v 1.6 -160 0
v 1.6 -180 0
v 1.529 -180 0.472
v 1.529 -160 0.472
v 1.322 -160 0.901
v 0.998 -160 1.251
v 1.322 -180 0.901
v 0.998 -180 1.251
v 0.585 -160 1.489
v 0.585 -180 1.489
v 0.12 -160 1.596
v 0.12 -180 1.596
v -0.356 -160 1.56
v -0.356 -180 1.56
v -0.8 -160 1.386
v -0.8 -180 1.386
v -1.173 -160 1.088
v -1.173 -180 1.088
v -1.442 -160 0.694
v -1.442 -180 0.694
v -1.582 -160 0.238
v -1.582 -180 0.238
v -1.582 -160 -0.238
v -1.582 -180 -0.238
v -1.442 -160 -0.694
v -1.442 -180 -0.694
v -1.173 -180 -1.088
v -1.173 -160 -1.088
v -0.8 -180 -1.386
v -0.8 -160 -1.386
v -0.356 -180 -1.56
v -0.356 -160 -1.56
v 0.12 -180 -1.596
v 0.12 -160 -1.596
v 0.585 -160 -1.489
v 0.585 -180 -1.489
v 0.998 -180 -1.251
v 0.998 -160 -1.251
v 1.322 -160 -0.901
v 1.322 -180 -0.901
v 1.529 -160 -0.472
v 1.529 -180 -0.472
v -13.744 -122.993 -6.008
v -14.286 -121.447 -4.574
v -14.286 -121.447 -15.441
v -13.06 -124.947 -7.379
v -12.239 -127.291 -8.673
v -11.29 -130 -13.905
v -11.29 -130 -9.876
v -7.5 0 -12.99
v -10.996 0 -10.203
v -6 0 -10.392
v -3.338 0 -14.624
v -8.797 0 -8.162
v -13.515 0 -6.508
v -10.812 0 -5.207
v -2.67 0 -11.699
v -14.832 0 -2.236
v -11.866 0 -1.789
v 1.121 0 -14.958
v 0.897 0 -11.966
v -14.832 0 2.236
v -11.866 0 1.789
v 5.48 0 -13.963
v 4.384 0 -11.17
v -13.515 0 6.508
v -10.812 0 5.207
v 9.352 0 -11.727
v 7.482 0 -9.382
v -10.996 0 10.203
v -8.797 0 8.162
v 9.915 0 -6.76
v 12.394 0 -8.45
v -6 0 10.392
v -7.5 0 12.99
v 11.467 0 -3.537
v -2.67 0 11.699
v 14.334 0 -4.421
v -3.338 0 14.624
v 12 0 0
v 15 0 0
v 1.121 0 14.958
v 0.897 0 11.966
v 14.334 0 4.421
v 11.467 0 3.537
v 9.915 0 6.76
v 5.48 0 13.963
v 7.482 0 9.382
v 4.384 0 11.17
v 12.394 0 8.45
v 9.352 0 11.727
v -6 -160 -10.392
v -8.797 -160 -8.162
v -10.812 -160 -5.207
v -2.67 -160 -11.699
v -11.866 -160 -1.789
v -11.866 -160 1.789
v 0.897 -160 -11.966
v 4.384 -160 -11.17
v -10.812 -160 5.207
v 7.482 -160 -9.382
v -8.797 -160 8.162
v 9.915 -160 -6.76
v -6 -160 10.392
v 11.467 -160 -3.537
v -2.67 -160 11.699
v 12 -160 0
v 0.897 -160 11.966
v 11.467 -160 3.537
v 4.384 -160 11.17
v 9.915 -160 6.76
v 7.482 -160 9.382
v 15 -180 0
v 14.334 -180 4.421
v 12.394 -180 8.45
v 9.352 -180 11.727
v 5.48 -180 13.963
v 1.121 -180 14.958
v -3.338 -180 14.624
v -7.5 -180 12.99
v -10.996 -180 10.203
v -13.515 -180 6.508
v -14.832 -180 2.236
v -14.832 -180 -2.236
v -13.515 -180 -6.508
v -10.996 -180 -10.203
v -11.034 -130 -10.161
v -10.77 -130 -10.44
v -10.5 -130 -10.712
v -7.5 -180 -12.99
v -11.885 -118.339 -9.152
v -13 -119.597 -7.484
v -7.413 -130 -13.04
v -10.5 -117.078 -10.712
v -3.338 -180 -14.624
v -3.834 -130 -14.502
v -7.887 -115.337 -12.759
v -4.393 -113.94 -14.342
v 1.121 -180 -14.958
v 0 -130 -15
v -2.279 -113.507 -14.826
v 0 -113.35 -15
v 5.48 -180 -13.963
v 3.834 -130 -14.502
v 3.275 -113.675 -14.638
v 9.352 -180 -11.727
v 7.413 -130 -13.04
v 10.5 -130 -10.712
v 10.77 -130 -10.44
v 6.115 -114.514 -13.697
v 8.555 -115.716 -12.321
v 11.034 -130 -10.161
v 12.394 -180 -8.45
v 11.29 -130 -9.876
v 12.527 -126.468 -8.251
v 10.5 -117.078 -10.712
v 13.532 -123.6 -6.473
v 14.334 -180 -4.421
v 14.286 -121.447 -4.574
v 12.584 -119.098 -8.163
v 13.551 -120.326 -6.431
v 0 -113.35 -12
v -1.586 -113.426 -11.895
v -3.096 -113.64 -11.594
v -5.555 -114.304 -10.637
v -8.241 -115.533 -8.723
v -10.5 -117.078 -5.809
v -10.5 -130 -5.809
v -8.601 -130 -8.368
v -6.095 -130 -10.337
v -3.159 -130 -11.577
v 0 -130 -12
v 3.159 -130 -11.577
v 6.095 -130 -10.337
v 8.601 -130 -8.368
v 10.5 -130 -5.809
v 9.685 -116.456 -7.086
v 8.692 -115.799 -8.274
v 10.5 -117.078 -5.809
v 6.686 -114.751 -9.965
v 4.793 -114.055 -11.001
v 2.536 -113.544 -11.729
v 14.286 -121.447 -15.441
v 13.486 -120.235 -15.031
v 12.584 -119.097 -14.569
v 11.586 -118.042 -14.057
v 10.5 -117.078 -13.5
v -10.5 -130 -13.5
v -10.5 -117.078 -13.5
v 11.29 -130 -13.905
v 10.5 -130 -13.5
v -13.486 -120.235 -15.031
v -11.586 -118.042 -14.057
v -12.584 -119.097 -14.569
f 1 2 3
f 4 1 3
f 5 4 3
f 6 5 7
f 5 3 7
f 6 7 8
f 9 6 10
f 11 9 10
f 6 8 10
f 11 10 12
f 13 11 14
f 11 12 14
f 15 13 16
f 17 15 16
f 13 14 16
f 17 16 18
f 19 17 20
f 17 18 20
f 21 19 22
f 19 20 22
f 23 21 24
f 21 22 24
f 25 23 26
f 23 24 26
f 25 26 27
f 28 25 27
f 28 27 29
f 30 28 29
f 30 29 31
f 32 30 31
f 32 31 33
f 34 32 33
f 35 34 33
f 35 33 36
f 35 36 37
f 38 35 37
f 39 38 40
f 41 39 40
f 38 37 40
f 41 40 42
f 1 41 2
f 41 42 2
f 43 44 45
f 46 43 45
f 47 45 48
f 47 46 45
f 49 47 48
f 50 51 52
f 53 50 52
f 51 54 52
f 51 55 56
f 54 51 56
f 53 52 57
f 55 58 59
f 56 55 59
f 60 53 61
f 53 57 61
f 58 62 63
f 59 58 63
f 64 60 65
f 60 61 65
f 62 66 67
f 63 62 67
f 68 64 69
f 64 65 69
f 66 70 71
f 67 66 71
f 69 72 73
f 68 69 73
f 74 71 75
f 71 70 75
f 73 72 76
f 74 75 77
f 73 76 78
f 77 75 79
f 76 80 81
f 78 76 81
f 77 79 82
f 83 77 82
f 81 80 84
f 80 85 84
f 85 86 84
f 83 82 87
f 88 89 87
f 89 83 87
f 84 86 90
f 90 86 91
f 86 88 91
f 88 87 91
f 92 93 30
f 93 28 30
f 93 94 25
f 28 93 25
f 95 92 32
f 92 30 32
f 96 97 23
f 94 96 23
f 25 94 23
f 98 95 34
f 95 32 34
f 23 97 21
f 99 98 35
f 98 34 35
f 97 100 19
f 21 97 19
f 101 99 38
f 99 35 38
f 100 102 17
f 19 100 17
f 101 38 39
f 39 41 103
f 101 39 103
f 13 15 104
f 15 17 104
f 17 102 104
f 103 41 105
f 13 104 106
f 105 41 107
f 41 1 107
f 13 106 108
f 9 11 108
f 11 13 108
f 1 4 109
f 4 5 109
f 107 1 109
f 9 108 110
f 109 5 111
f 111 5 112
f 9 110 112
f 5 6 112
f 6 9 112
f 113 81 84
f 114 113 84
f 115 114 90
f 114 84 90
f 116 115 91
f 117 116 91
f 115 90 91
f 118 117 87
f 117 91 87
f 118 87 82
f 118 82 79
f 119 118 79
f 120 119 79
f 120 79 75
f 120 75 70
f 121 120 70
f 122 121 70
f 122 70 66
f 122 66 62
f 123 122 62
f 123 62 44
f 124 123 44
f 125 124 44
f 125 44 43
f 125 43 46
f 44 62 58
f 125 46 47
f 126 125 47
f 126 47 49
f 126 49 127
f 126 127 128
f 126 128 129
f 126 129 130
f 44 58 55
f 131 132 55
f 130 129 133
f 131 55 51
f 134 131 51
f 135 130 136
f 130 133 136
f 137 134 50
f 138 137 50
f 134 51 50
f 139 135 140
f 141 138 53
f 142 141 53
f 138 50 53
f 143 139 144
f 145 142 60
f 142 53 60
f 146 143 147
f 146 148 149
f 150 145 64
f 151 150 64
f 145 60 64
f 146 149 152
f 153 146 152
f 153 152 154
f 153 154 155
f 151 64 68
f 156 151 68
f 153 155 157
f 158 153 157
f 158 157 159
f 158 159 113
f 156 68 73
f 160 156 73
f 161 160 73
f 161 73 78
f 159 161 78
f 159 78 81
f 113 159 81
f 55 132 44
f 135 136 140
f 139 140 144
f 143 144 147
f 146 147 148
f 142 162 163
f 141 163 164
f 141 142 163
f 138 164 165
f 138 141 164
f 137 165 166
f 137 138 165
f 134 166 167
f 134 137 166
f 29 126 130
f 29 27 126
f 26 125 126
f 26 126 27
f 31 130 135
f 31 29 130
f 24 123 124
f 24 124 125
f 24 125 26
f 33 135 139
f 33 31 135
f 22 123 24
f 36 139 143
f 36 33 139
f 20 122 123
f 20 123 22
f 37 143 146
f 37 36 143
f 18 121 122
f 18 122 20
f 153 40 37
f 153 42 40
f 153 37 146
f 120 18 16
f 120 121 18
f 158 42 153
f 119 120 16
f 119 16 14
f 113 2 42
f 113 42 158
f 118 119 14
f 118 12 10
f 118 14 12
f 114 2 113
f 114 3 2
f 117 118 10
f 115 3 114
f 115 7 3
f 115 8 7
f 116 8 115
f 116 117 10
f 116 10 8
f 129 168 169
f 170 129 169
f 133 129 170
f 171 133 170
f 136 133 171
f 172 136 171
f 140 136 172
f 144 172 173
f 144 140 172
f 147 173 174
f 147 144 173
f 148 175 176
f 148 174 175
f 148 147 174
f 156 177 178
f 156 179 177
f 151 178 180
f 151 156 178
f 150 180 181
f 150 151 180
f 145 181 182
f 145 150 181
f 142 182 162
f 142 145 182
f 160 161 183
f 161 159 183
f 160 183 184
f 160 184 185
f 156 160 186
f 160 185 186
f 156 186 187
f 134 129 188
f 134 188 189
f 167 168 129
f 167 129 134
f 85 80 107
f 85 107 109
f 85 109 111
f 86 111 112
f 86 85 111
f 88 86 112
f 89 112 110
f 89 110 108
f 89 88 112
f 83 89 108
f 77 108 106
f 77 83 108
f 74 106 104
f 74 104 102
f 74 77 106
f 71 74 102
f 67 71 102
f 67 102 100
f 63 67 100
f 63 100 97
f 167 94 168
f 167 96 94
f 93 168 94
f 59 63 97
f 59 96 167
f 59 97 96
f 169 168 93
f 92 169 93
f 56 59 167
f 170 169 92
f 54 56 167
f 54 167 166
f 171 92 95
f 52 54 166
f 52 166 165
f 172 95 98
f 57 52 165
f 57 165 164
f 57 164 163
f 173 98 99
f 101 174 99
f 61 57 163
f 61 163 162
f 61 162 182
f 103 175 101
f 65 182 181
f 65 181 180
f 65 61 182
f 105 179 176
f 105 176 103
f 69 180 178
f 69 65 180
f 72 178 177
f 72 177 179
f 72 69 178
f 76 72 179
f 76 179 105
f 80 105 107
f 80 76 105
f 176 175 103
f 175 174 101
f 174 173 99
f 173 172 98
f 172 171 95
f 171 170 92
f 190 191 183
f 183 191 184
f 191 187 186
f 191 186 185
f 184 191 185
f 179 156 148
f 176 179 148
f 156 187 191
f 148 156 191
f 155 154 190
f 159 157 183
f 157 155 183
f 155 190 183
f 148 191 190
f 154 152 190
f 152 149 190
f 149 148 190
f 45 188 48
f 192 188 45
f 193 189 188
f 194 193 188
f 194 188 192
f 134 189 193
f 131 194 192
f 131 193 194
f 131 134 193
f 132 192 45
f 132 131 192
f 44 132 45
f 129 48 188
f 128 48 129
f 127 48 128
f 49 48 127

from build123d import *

# Parameters (mm, degrees)
F0_R         = 15
F0_R_2       = 12
F1_DEPTH     = 180
F2_DEPTH     = 160
F5_DEPTH     = 20
F6_DEPTH     = 18
F7_DEPTH     = 0.5
F8_DEPTH     = 160
F9_T1_DEPTH  = 33.1189779758
F10_T1_DEPTH = 33.1189779758
F11_R        = 1.6
F12_DEPTH    = 20


# Not quite as in the source:
# - a fillet or chamfer that OpenCascade refuses, or shapes differently, is made with other operations: its cross-section is extruded or revolved along the edge and cut away or added


with BuildPart() as f1:
    # F0 (on Front) → F1 (new body)
    with BuildSketch(Plane.XZ):
        Circle(F0_R)
        Circle(F0_R_2, mode=Mode.SUBTRACT)
        Circle(F0_R_2)
    extrude(amount=F1_DEPTH)

    # F0 (on Front) → F2 (cut)
    with BuildSketch(Plane.XZ):
        Circle(F0_R_2)
    extrude(amount=F2_DEPTH, mode=Mode.SUBTRACT)

    # F4 (on offset) → F5 (cut)
    with BuildSketch(Plane.XY.offset(-15)):
        with BuildLine():
            ThreePointArc((10.5, -117.0782160674), (5.5711218584, -114.3097131563), (0, -113.35))
            Line((0, -113.35), (0, -130))
            Line((0, -130), (7, -130))
            Line((7, -130), (10.5, -130))
            Line((10.5, -130), (10.5, -117.0782160674))
        make_face()
        with BuildLine():
            Line((0, -130), (0, -113.35))
            ThreePointArc((0, -113.35), (-5.5711218584, -114.3097131563), (-10.5, -117.0782160674))
            Line((-10.5, -117.0782160674), (-10.5, -130))
            Line((-10.5, -130), (-7, -130))
            Line((-7, -130), (0, -130))
        make_face()
    extrude(amount=F5_DEPTH, mode=Mode.SUBTRACT)

    # F4 (on offset) → F6 (join)
    with BuildSketch(Plane.XY.offset(-15)):
        with BuildLine():
            ThreePointArc((14.2855073516, -121.4474109355), (12.5838312774, -119.0972622529), (10.5, -117.0782160674))
            Line((10.5, -117.0782160674), (10.5, -130))
            Line((10.5, -130), (11.29, -130))
            Line((11.29, -130), (14.2855073516, -121.4474109355))
        make_face()
        with BuildLine():
            Line((-10.5, -130), (-10.5, -117.0782160674))
            ThreePointArc((-10.5, -117.0782160674), (-12.5838312774, -119.0972622529), (-14.2855073516, -121.4474109355))
            Line((-14.2855073516, -121.4474109355), (-11.29, -130))
            Line((-11.29, -130), (-10.5, -130))
        make_face()
    extrude(amount=F6_DEPTH)

    # F4 (on offset) → F7 (join)
    with BuildSketch(Plane.XY.offset(-15)):
        with BuildLine():
            Line((-10.5, -130), (-10.5, -117.0782160674))
            ThreePointArc((-10.5, -117.0782160674), (-12.5838312774, -119.0972622529), (-14.2855073516, -121.4474109355))
            Line((-14.2855073516, -121.4474109355), (-11.29, -130))
            Line((-11.29, -130), (-10.5, -130))
        make_face()
        with BuildLine():
            ThreePointArc((14.2855073516, -121.4474109355), (12.5838312774, -119.0972622529), (10.5, -117.0782160674))
            Line((10.5, -117.0782160674), (10.5, -130))
            Line((10.5, -130), (11.29, -130))
            Line((11.29, -130), (14.2855073516, -121.4474109355))
        make_face()
    extrude(amount=-F7_DEPTH)

    # F0 (on Front) → F8 (cut)
    with BuildSketch(Plane.XZ):
        Circle(F0_R_2)
    extrude(amount=F8_DEPTH, mode=Mode.SUBTRACT)

    # F9: chamfer of 3.9 x 2 on 1 edges, made by hand

    # F9_s2 → F9_t1 (cut)
    with BuildSketch(Plane.XZ.offset(106.9796190458)):
        Polygon((10.5, -13.5), (14.4, -15.5), (10.5, -15.5), align=None)
    extrude(amount=F9_T1_DEPTH, mode=Mode.SUBTRACT)

    # F10: chamfer of 2 x 3.9 on 1 edges, made by hand

    # F10_s2 → F10_t1 (cut)
    with BuildSketch(Plane.XZ.offset(106.9796190458)):
        Polygon((-10.5, -13.5), (-14.4, -15.5), (-10.5, -15.5), align=None)
    extrude(amount=F10_T1_DEPTH, mode=Mode.SUBTRACT)

    # F11 (on face) → F12 (cut)
    with BuildSketch(Plane.XZ.offset(180)):
        Circle(F11_R)
    extrude(amount=-F12_DEPTH, mode=Mode.SUBTRACT)


solid = f1.part
